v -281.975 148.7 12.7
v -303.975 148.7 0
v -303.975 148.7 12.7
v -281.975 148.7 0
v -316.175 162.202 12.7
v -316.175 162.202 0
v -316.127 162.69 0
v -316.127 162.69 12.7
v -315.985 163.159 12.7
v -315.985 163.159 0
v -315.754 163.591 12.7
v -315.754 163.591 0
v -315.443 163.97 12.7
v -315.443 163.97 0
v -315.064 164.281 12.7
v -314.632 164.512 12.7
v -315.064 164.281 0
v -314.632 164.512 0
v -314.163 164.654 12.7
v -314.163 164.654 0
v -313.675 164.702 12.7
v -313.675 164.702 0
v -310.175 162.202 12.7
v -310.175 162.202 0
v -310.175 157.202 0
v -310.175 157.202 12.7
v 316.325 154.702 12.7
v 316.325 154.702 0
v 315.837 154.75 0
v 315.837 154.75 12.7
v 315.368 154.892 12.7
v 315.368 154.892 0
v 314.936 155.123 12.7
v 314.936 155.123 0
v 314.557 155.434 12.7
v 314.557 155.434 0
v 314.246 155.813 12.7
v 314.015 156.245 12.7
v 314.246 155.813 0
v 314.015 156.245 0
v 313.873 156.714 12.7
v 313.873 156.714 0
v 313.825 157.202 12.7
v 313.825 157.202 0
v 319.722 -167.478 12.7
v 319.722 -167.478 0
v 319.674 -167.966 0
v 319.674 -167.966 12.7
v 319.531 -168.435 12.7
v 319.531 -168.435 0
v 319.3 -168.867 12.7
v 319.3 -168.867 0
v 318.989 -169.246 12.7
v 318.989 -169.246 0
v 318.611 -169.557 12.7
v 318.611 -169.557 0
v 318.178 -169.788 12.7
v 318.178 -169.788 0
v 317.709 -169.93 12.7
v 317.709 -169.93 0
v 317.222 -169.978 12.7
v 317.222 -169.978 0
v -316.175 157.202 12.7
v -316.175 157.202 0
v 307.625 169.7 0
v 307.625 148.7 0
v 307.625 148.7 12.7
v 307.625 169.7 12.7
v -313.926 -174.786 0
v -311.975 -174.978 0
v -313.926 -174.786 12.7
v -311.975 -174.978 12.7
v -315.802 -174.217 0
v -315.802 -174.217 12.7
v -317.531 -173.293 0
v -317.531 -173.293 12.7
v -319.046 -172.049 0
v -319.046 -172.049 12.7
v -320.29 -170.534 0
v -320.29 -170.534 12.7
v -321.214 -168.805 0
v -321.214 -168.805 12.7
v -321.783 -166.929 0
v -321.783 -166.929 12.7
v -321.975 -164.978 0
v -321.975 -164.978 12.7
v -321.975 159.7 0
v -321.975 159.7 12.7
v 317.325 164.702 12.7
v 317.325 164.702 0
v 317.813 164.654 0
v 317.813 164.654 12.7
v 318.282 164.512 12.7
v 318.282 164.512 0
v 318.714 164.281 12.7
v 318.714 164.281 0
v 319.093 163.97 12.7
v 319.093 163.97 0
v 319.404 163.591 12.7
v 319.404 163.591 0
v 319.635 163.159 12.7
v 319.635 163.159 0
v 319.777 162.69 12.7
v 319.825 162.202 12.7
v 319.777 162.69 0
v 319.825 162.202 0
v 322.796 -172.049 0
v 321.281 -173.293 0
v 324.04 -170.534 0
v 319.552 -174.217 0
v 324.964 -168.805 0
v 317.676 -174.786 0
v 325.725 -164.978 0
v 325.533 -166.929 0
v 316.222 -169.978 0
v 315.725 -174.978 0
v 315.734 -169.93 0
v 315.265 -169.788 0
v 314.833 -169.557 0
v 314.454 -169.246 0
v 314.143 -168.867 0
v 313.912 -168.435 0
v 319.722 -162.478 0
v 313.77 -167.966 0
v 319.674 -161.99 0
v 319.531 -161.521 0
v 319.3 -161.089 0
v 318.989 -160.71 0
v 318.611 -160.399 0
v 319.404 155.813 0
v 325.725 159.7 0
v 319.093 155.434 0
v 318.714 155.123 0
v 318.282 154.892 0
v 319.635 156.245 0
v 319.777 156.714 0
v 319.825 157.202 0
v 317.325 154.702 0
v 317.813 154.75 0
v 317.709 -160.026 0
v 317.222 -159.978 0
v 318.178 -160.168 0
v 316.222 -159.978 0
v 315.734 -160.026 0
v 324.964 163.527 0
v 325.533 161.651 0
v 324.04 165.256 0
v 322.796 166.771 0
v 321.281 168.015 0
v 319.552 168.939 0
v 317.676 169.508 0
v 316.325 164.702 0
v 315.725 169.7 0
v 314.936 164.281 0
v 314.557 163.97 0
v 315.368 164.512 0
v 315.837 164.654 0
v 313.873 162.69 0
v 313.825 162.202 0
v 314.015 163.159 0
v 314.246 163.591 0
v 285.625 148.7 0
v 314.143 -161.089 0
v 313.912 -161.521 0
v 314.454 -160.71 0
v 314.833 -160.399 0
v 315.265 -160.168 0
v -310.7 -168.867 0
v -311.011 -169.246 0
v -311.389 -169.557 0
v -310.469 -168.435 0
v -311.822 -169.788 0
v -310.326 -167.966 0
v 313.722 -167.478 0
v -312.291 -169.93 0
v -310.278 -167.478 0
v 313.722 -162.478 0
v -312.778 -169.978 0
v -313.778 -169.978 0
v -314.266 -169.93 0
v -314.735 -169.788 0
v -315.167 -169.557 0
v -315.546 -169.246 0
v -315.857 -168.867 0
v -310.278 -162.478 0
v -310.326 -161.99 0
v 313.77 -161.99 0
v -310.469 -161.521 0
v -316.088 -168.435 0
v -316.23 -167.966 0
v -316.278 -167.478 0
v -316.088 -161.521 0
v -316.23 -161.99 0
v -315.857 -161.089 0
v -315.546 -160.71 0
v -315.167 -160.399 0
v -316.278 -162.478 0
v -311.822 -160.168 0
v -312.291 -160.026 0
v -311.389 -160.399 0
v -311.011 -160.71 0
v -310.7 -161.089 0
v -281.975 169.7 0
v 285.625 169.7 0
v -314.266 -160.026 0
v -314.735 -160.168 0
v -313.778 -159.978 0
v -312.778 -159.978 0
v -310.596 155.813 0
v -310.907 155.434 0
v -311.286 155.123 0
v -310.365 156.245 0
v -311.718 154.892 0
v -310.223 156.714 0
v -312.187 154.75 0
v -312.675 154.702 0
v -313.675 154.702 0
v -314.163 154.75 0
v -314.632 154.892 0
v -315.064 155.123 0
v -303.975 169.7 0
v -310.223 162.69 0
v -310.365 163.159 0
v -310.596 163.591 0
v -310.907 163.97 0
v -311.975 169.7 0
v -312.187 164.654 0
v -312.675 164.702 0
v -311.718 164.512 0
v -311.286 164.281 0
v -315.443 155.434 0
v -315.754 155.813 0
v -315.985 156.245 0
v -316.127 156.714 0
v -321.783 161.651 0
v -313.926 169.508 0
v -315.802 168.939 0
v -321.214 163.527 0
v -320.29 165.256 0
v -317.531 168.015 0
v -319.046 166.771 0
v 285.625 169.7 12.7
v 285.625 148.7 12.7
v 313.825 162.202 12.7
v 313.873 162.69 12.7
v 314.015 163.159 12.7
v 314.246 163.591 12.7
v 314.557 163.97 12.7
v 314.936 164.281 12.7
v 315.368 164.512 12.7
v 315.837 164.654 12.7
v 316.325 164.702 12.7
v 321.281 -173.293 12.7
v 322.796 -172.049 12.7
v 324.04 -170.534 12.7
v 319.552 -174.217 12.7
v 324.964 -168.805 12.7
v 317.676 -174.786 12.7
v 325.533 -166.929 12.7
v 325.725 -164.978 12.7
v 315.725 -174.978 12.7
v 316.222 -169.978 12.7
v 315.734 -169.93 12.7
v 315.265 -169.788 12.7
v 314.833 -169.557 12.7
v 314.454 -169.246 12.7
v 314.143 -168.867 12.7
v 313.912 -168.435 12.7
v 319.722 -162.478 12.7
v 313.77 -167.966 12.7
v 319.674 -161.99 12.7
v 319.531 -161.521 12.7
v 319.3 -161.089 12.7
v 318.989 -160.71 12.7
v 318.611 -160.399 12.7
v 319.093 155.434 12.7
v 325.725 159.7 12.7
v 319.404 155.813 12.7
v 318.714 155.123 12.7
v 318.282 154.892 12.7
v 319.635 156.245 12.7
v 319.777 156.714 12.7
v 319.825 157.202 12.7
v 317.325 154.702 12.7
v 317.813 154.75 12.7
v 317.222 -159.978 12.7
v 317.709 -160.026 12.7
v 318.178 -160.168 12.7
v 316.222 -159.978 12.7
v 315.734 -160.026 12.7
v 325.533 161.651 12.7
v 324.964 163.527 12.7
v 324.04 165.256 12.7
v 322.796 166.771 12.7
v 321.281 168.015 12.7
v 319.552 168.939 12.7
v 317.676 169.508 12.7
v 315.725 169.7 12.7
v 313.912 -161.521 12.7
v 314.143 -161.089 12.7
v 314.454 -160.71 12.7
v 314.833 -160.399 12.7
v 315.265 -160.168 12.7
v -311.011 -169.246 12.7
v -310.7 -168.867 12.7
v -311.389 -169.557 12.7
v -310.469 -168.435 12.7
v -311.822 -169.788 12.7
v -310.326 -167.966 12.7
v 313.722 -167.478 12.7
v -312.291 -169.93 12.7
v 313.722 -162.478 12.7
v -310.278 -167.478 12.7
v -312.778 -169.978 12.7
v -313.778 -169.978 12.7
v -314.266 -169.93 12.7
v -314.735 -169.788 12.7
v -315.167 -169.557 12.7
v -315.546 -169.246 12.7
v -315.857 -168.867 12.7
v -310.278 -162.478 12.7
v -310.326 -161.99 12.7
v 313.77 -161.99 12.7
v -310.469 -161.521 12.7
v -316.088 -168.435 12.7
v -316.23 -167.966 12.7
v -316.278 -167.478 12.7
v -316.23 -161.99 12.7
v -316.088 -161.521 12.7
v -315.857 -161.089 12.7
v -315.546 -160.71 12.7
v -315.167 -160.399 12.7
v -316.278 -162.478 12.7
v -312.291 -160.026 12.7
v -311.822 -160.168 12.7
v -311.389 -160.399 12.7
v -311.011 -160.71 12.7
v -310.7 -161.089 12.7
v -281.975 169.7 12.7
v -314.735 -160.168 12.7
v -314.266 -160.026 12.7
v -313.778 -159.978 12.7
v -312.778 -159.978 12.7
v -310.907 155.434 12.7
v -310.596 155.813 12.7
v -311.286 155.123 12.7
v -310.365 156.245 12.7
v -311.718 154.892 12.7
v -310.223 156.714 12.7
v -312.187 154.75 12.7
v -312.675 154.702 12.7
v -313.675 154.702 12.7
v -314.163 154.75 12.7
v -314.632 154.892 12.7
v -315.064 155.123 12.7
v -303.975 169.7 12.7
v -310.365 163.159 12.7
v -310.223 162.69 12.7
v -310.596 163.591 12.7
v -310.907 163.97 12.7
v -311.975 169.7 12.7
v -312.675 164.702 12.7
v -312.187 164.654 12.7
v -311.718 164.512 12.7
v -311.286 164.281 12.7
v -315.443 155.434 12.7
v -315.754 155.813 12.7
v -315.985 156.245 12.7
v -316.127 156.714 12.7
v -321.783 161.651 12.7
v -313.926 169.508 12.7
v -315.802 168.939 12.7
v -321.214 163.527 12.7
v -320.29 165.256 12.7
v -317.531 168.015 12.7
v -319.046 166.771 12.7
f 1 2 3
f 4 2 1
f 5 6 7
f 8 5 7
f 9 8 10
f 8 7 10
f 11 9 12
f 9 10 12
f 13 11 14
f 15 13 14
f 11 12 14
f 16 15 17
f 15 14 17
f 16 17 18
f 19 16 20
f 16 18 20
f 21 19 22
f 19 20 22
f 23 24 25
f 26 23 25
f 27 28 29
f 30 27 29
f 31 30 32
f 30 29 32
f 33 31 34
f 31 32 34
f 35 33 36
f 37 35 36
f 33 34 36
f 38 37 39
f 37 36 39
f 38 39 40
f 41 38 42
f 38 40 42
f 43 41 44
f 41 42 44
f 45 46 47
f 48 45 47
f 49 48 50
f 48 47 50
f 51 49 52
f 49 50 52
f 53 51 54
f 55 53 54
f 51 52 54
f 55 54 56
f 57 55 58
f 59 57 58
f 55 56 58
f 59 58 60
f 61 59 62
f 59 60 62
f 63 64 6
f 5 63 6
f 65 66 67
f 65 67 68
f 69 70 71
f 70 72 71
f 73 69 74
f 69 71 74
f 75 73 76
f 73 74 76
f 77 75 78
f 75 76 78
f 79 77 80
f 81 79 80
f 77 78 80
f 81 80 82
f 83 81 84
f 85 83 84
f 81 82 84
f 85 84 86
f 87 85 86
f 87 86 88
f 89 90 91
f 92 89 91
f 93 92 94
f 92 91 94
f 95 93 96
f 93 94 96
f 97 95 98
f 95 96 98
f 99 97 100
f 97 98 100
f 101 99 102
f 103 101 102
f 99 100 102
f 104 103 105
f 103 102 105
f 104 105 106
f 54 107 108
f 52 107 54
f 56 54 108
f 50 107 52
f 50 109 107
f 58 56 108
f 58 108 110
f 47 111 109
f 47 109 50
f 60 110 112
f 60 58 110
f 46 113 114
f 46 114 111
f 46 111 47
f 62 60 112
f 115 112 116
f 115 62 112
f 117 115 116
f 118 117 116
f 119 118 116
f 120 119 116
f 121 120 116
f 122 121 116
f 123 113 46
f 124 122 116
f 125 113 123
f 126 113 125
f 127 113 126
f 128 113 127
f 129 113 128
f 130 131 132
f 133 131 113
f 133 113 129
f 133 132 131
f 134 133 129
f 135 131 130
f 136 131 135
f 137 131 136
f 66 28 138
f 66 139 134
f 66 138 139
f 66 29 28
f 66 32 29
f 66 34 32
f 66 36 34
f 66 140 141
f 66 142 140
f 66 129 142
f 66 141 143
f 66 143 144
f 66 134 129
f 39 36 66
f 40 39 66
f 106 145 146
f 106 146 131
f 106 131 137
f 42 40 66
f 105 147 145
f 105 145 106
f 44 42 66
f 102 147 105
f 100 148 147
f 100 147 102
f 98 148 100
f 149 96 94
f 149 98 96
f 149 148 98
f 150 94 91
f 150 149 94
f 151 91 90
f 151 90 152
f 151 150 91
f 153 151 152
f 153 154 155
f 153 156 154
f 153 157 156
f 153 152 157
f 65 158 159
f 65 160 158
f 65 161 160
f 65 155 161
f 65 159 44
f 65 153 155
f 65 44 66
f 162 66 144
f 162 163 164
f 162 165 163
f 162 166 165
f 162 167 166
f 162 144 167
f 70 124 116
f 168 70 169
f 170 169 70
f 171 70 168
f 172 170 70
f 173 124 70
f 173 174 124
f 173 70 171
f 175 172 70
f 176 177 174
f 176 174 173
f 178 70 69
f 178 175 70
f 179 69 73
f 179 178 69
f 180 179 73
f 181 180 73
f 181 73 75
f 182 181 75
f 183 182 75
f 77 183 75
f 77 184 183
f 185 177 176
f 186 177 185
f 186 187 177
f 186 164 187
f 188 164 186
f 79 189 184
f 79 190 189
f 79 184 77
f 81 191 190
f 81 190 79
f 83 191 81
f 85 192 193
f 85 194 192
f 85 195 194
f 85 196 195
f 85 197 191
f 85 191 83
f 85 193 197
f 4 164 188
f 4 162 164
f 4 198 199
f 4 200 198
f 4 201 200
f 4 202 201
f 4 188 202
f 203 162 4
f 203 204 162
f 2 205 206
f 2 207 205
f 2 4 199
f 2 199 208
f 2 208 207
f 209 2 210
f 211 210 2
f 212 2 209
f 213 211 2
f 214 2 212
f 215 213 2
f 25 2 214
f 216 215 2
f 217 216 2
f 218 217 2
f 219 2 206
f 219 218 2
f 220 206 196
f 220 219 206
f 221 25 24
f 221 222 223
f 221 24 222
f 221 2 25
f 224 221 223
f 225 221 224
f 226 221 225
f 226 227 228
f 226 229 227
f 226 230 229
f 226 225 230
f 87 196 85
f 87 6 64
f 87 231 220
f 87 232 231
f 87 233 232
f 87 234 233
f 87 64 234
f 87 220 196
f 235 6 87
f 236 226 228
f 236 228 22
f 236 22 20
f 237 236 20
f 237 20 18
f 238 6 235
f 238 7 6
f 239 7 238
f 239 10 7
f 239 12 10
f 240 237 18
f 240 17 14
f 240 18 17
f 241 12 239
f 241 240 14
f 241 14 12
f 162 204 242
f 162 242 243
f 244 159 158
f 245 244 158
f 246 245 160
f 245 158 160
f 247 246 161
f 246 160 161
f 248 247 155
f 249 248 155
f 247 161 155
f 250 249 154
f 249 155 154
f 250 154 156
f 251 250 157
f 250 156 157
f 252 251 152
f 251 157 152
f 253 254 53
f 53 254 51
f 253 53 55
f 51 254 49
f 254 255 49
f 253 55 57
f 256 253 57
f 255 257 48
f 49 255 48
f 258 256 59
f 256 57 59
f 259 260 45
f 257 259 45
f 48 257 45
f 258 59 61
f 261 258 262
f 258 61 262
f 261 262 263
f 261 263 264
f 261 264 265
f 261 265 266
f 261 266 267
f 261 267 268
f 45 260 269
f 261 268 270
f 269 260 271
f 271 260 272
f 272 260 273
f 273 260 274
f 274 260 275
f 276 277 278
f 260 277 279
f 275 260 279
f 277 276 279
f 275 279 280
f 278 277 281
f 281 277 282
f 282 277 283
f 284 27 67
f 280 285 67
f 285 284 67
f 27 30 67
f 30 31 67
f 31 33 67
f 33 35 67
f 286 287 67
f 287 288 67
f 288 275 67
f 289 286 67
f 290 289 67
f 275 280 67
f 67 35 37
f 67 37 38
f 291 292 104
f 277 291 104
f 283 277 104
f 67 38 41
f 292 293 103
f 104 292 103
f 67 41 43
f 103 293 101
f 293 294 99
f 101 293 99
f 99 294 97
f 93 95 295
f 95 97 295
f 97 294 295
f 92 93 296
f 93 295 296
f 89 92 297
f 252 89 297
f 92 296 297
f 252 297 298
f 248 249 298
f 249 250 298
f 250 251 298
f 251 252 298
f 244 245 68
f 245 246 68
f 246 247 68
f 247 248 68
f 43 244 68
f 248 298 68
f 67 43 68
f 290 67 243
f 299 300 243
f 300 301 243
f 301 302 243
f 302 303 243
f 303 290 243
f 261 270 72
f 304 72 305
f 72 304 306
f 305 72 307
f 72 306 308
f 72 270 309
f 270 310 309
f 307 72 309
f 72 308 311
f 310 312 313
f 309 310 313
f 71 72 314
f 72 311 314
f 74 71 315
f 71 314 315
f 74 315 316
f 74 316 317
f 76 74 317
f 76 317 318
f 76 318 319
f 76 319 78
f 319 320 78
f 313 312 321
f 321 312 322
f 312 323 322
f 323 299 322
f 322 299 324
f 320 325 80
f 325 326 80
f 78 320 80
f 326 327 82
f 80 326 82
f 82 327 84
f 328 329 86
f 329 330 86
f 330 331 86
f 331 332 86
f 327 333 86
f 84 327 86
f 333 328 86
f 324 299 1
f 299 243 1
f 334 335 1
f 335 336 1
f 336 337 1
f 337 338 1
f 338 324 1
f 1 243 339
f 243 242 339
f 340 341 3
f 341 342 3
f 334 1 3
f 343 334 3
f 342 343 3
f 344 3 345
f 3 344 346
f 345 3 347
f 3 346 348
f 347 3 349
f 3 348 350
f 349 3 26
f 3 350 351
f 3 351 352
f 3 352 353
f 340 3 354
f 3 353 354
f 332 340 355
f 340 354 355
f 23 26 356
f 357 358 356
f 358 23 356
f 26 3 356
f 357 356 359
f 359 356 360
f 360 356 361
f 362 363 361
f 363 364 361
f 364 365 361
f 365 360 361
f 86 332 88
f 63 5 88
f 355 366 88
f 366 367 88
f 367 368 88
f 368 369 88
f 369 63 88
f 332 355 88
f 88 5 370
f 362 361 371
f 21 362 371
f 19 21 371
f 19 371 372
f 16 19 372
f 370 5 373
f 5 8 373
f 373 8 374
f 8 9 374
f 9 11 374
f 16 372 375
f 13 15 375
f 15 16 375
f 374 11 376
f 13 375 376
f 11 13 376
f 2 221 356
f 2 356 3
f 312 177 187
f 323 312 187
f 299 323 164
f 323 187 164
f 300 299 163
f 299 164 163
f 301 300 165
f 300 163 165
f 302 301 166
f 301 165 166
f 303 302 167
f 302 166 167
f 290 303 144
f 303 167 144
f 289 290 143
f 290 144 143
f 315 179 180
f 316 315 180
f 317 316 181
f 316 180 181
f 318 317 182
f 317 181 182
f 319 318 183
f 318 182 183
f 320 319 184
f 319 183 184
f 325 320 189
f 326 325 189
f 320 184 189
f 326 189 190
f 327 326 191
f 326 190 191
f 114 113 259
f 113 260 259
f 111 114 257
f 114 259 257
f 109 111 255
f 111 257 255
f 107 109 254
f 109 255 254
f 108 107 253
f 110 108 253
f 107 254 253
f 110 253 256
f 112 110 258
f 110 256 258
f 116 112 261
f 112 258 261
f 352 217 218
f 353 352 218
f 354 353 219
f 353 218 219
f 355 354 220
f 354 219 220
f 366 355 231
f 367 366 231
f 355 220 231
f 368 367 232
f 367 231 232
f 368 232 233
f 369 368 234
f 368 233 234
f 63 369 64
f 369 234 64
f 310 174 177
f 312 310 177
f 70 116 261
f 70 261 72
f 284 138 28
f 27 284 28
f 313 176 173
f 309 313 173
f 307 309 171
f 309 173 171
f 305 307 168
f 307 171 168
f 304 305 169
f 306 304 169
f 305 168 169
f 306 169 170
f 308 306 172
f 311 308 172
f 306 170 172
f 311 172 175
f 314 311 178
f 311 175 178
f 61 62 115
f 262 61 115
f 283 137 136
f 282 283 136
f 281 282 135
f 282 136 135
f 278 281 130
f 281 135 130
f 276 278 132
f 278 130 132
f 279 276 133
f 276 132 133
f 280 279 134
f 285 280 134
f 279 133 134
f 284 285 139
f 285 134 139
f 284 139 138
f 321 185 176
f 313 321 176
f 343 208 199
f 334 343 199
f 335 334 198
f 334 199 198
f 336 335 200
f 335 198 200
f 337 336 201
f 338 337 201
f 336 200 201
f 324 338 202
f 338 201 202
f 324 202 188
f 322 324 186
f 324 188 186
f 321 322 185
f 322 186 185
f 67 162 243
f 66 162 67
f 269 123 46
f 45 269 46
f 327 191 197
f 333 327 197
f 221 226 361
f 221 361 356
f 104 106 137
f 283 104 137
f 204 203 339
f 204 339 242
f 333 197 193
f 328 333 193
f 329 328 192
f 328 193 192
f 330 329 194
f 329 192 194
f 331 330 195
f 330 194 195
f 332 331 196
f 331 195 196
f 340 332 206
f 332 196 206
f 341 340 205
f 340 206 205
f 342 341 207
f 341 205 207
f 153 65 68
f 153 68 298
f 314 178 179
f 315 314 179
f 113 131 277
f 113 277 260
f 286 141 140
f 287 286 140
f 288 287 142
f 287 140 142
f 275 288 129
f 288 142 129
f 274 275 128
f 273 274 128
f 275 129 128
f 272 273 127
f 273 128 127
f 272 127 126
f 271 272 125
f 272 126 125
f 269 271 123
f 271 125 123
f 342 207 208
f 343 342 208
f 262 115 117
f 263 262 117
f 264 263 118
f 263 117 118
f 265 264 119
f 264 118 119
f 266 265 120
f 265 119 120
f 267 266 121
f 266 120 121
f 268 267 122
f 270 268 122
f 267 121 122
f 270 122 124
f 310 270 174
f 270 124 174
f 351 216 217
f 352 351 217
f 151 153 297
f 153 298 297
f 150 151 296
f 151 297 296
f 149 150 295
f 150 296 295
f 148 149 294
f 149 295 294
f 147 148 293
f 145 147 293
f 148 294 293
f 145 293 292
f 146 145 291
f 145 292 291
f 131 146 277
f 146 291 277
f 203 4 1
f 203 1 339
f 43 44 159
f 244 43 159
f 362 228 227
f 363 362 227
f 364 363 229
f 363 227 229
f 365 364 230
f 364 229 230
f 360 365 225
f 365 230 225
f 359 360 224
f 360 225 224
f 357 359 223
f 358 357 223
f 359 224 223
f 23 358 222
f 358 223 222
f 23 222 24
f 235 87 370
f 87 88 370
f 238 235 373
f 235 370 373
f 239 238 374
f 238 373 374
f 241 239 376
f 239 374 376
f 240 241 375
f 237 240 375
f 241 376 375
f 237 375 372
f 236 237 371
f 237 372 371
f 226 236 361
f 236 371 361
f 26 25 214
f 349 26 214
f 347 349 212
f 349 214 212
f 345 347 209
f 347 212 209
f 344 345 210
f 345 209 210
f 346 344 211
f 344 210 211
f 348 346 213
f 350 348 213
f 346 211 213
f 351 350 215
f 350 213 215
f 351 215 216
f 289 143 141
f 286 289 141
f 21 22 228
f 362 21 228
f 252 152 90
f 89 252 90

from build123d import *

# Parameters (mm, degrees)
BOSS_EXTRUDE1_DEPTH = 12.7
FILLET1_R           = 10


with BuildPart() as part:
    # Sketch1 → Boss-Extrude1 (new body)
    with BuildSketch(Plane.XY):
        Polygon((307.625143269, 169.700104384), (325.725145069, 169.700104384), (325.725145069, -174.977895616), (-321.974854931, -174.977895616), (-321.974854931, 169.700104384), (-303.974854931, 169.700104384), (-303.974854931, 148.700104384), (-281.974854931, 148.700104384), (-281.974854931, 169.700104384), (285.625143269, 169.700104384), (285.625143269, 148.700104384), (307.625143269, 148.700104384), align=None)
        with BuildLine():
            Line((317.221591679, -169.977895616), (316.221591679, -169.977895616))
            ThreePointArc((316.221591679, -169.977895616), (314.453824726, -169.245662569), (313.721591679, -167.477895616))
            Line((313.721591679, -167.477895616), (313.721591679, -162.477895616))
            ThreePointArc((313.721591679, -162.477895616), (314.453824726, -160.710128663), (316.221591679, -159.977895616))
            Line((316.221591679, -159.977895616), (317.221591679, -159.977895616))
            ThreePointArc((317.221591679, -159.977895616), (318.989358632, -160.710128663), (319.721591679, -162.477895616))
            Line((319.721591679, -162.477895616), (319.721591679, -167.477895616))
            ThreePointArc((319.721591679, -167.477895616), (318.989358632, -169.245662569), (317.221591679, -169.977895616))
        make_face(mode=Mode.SUBTRACT)
        with BuildLine():
            Line((-312.778408321, -169.977895616), (-313.778408321, -169.977895616))
            ThreePointArc((-313.778408321, -169.977895616), (-315.546175274, -169.245662569), (-316.278408321, -167.477895616))
            Line((-316.278408321, -167.477895616), (-316.278408321, -162.477895616))
            ThreePointArc((-316.278408321, -162.477895616), (-315.546175274, -160.710128663), (-313.778408321, -159.977895616))
            Line((-313.778408321, -159.977895616), (-312.778408321, -159.977895616))
            ThreePointArc((-312.778408321, -159.977895616), (-311.010641368, -160.710128663), (-310.278408321, -162.477895616))
            Line((-310.278408321, -162.477895616), (-310.278408321, -167.477895616))
            ThreePointArc((-310.278408321, -167.477895616), (-311.010641368, -169.245662569), (-312.778408321, -169.977895616))
        make_face(mode=Mode.SUBTRACT)
        with BuildLine():
            Line((-312.674854931, 154.702104384), (-313.674854931, 154.702104384))
            ThreePointArc((-313.674854931, 154.702104384), (-315.442621884, 155.434337431), (-316.174854931, 157.202104384))
            Line((-316.174854931, 157.202104384), (-316.174854931, 162.202104384))
            ThreePointArc((-316.174854931, 162.202104384), (-315.442621884, 163.969871337), (-313.674854931, 164.702104384))
            Line((-313.674854931, 164.702104384), (-312.674854931, 164.702104384))
            ThreePointArc((-312.674854931, 164.702104384), (-310.907087978, 163.969871337), (-310.174854931, 162.202104384))
            Line((-310.174854931, 162.202104384), (-310.174854931, 157.202104384))
            ThreePointArc((-310.174854931, 157.202104384), (-310.907087978, 155.434337431), (-312.674854931, 154.702104384))
        make_face(mode=Mode.SUBTRACT)
        with BuildLine():
            Line((317.325145069, 154.702104384), (316.325145069, 154.702104384))
            ThreePointArc((316.325145069, 154.702104384), (314.557378116, 155.434337431), (313.825145069, 157.202104384))
            Line((313.825145069, 157.202104384), (313.825145069, 162.202104384))
            ThreePointArc((313.825145069, 162.202104384), (314.557378116, 163.969871337), (316.325145069, 164.702104384))
            Line((316.325145069, 164.702104384), (317.325145069, 164.702104384))
            ThreePointArc((317.325145069, 164.702104384), (319.092912022, 163.969871337), (319.825145069, 162.202104384))
            Line((319.825145069, 162.202104384), (319.825145069, 157.202104384))
            ThreePointArc((319.825145069, 157.202104384), (319.092912022, 155.434337431), (317.325145069, 154.702104384))
        make_face(mode=Mode.SUBTRACT)
    extrude(amount=BOSS_EXTRUDE1_DEPTH)

    # Fillet1
    fillet1_edges = [part.edges().sort_by_distance(p)[0] for p in [
        (-321.974854931, 169.700104384, 6.35),
        (-321.974854931, -174.977895616, 6.35),
        (325.725145069, -174.977895616, 6.35),
        (325.725145069, 169.700104384, 6.35),
    ]]
    fillet(fillet1_edges, radius=FILLET1_R)


solid = part.part
